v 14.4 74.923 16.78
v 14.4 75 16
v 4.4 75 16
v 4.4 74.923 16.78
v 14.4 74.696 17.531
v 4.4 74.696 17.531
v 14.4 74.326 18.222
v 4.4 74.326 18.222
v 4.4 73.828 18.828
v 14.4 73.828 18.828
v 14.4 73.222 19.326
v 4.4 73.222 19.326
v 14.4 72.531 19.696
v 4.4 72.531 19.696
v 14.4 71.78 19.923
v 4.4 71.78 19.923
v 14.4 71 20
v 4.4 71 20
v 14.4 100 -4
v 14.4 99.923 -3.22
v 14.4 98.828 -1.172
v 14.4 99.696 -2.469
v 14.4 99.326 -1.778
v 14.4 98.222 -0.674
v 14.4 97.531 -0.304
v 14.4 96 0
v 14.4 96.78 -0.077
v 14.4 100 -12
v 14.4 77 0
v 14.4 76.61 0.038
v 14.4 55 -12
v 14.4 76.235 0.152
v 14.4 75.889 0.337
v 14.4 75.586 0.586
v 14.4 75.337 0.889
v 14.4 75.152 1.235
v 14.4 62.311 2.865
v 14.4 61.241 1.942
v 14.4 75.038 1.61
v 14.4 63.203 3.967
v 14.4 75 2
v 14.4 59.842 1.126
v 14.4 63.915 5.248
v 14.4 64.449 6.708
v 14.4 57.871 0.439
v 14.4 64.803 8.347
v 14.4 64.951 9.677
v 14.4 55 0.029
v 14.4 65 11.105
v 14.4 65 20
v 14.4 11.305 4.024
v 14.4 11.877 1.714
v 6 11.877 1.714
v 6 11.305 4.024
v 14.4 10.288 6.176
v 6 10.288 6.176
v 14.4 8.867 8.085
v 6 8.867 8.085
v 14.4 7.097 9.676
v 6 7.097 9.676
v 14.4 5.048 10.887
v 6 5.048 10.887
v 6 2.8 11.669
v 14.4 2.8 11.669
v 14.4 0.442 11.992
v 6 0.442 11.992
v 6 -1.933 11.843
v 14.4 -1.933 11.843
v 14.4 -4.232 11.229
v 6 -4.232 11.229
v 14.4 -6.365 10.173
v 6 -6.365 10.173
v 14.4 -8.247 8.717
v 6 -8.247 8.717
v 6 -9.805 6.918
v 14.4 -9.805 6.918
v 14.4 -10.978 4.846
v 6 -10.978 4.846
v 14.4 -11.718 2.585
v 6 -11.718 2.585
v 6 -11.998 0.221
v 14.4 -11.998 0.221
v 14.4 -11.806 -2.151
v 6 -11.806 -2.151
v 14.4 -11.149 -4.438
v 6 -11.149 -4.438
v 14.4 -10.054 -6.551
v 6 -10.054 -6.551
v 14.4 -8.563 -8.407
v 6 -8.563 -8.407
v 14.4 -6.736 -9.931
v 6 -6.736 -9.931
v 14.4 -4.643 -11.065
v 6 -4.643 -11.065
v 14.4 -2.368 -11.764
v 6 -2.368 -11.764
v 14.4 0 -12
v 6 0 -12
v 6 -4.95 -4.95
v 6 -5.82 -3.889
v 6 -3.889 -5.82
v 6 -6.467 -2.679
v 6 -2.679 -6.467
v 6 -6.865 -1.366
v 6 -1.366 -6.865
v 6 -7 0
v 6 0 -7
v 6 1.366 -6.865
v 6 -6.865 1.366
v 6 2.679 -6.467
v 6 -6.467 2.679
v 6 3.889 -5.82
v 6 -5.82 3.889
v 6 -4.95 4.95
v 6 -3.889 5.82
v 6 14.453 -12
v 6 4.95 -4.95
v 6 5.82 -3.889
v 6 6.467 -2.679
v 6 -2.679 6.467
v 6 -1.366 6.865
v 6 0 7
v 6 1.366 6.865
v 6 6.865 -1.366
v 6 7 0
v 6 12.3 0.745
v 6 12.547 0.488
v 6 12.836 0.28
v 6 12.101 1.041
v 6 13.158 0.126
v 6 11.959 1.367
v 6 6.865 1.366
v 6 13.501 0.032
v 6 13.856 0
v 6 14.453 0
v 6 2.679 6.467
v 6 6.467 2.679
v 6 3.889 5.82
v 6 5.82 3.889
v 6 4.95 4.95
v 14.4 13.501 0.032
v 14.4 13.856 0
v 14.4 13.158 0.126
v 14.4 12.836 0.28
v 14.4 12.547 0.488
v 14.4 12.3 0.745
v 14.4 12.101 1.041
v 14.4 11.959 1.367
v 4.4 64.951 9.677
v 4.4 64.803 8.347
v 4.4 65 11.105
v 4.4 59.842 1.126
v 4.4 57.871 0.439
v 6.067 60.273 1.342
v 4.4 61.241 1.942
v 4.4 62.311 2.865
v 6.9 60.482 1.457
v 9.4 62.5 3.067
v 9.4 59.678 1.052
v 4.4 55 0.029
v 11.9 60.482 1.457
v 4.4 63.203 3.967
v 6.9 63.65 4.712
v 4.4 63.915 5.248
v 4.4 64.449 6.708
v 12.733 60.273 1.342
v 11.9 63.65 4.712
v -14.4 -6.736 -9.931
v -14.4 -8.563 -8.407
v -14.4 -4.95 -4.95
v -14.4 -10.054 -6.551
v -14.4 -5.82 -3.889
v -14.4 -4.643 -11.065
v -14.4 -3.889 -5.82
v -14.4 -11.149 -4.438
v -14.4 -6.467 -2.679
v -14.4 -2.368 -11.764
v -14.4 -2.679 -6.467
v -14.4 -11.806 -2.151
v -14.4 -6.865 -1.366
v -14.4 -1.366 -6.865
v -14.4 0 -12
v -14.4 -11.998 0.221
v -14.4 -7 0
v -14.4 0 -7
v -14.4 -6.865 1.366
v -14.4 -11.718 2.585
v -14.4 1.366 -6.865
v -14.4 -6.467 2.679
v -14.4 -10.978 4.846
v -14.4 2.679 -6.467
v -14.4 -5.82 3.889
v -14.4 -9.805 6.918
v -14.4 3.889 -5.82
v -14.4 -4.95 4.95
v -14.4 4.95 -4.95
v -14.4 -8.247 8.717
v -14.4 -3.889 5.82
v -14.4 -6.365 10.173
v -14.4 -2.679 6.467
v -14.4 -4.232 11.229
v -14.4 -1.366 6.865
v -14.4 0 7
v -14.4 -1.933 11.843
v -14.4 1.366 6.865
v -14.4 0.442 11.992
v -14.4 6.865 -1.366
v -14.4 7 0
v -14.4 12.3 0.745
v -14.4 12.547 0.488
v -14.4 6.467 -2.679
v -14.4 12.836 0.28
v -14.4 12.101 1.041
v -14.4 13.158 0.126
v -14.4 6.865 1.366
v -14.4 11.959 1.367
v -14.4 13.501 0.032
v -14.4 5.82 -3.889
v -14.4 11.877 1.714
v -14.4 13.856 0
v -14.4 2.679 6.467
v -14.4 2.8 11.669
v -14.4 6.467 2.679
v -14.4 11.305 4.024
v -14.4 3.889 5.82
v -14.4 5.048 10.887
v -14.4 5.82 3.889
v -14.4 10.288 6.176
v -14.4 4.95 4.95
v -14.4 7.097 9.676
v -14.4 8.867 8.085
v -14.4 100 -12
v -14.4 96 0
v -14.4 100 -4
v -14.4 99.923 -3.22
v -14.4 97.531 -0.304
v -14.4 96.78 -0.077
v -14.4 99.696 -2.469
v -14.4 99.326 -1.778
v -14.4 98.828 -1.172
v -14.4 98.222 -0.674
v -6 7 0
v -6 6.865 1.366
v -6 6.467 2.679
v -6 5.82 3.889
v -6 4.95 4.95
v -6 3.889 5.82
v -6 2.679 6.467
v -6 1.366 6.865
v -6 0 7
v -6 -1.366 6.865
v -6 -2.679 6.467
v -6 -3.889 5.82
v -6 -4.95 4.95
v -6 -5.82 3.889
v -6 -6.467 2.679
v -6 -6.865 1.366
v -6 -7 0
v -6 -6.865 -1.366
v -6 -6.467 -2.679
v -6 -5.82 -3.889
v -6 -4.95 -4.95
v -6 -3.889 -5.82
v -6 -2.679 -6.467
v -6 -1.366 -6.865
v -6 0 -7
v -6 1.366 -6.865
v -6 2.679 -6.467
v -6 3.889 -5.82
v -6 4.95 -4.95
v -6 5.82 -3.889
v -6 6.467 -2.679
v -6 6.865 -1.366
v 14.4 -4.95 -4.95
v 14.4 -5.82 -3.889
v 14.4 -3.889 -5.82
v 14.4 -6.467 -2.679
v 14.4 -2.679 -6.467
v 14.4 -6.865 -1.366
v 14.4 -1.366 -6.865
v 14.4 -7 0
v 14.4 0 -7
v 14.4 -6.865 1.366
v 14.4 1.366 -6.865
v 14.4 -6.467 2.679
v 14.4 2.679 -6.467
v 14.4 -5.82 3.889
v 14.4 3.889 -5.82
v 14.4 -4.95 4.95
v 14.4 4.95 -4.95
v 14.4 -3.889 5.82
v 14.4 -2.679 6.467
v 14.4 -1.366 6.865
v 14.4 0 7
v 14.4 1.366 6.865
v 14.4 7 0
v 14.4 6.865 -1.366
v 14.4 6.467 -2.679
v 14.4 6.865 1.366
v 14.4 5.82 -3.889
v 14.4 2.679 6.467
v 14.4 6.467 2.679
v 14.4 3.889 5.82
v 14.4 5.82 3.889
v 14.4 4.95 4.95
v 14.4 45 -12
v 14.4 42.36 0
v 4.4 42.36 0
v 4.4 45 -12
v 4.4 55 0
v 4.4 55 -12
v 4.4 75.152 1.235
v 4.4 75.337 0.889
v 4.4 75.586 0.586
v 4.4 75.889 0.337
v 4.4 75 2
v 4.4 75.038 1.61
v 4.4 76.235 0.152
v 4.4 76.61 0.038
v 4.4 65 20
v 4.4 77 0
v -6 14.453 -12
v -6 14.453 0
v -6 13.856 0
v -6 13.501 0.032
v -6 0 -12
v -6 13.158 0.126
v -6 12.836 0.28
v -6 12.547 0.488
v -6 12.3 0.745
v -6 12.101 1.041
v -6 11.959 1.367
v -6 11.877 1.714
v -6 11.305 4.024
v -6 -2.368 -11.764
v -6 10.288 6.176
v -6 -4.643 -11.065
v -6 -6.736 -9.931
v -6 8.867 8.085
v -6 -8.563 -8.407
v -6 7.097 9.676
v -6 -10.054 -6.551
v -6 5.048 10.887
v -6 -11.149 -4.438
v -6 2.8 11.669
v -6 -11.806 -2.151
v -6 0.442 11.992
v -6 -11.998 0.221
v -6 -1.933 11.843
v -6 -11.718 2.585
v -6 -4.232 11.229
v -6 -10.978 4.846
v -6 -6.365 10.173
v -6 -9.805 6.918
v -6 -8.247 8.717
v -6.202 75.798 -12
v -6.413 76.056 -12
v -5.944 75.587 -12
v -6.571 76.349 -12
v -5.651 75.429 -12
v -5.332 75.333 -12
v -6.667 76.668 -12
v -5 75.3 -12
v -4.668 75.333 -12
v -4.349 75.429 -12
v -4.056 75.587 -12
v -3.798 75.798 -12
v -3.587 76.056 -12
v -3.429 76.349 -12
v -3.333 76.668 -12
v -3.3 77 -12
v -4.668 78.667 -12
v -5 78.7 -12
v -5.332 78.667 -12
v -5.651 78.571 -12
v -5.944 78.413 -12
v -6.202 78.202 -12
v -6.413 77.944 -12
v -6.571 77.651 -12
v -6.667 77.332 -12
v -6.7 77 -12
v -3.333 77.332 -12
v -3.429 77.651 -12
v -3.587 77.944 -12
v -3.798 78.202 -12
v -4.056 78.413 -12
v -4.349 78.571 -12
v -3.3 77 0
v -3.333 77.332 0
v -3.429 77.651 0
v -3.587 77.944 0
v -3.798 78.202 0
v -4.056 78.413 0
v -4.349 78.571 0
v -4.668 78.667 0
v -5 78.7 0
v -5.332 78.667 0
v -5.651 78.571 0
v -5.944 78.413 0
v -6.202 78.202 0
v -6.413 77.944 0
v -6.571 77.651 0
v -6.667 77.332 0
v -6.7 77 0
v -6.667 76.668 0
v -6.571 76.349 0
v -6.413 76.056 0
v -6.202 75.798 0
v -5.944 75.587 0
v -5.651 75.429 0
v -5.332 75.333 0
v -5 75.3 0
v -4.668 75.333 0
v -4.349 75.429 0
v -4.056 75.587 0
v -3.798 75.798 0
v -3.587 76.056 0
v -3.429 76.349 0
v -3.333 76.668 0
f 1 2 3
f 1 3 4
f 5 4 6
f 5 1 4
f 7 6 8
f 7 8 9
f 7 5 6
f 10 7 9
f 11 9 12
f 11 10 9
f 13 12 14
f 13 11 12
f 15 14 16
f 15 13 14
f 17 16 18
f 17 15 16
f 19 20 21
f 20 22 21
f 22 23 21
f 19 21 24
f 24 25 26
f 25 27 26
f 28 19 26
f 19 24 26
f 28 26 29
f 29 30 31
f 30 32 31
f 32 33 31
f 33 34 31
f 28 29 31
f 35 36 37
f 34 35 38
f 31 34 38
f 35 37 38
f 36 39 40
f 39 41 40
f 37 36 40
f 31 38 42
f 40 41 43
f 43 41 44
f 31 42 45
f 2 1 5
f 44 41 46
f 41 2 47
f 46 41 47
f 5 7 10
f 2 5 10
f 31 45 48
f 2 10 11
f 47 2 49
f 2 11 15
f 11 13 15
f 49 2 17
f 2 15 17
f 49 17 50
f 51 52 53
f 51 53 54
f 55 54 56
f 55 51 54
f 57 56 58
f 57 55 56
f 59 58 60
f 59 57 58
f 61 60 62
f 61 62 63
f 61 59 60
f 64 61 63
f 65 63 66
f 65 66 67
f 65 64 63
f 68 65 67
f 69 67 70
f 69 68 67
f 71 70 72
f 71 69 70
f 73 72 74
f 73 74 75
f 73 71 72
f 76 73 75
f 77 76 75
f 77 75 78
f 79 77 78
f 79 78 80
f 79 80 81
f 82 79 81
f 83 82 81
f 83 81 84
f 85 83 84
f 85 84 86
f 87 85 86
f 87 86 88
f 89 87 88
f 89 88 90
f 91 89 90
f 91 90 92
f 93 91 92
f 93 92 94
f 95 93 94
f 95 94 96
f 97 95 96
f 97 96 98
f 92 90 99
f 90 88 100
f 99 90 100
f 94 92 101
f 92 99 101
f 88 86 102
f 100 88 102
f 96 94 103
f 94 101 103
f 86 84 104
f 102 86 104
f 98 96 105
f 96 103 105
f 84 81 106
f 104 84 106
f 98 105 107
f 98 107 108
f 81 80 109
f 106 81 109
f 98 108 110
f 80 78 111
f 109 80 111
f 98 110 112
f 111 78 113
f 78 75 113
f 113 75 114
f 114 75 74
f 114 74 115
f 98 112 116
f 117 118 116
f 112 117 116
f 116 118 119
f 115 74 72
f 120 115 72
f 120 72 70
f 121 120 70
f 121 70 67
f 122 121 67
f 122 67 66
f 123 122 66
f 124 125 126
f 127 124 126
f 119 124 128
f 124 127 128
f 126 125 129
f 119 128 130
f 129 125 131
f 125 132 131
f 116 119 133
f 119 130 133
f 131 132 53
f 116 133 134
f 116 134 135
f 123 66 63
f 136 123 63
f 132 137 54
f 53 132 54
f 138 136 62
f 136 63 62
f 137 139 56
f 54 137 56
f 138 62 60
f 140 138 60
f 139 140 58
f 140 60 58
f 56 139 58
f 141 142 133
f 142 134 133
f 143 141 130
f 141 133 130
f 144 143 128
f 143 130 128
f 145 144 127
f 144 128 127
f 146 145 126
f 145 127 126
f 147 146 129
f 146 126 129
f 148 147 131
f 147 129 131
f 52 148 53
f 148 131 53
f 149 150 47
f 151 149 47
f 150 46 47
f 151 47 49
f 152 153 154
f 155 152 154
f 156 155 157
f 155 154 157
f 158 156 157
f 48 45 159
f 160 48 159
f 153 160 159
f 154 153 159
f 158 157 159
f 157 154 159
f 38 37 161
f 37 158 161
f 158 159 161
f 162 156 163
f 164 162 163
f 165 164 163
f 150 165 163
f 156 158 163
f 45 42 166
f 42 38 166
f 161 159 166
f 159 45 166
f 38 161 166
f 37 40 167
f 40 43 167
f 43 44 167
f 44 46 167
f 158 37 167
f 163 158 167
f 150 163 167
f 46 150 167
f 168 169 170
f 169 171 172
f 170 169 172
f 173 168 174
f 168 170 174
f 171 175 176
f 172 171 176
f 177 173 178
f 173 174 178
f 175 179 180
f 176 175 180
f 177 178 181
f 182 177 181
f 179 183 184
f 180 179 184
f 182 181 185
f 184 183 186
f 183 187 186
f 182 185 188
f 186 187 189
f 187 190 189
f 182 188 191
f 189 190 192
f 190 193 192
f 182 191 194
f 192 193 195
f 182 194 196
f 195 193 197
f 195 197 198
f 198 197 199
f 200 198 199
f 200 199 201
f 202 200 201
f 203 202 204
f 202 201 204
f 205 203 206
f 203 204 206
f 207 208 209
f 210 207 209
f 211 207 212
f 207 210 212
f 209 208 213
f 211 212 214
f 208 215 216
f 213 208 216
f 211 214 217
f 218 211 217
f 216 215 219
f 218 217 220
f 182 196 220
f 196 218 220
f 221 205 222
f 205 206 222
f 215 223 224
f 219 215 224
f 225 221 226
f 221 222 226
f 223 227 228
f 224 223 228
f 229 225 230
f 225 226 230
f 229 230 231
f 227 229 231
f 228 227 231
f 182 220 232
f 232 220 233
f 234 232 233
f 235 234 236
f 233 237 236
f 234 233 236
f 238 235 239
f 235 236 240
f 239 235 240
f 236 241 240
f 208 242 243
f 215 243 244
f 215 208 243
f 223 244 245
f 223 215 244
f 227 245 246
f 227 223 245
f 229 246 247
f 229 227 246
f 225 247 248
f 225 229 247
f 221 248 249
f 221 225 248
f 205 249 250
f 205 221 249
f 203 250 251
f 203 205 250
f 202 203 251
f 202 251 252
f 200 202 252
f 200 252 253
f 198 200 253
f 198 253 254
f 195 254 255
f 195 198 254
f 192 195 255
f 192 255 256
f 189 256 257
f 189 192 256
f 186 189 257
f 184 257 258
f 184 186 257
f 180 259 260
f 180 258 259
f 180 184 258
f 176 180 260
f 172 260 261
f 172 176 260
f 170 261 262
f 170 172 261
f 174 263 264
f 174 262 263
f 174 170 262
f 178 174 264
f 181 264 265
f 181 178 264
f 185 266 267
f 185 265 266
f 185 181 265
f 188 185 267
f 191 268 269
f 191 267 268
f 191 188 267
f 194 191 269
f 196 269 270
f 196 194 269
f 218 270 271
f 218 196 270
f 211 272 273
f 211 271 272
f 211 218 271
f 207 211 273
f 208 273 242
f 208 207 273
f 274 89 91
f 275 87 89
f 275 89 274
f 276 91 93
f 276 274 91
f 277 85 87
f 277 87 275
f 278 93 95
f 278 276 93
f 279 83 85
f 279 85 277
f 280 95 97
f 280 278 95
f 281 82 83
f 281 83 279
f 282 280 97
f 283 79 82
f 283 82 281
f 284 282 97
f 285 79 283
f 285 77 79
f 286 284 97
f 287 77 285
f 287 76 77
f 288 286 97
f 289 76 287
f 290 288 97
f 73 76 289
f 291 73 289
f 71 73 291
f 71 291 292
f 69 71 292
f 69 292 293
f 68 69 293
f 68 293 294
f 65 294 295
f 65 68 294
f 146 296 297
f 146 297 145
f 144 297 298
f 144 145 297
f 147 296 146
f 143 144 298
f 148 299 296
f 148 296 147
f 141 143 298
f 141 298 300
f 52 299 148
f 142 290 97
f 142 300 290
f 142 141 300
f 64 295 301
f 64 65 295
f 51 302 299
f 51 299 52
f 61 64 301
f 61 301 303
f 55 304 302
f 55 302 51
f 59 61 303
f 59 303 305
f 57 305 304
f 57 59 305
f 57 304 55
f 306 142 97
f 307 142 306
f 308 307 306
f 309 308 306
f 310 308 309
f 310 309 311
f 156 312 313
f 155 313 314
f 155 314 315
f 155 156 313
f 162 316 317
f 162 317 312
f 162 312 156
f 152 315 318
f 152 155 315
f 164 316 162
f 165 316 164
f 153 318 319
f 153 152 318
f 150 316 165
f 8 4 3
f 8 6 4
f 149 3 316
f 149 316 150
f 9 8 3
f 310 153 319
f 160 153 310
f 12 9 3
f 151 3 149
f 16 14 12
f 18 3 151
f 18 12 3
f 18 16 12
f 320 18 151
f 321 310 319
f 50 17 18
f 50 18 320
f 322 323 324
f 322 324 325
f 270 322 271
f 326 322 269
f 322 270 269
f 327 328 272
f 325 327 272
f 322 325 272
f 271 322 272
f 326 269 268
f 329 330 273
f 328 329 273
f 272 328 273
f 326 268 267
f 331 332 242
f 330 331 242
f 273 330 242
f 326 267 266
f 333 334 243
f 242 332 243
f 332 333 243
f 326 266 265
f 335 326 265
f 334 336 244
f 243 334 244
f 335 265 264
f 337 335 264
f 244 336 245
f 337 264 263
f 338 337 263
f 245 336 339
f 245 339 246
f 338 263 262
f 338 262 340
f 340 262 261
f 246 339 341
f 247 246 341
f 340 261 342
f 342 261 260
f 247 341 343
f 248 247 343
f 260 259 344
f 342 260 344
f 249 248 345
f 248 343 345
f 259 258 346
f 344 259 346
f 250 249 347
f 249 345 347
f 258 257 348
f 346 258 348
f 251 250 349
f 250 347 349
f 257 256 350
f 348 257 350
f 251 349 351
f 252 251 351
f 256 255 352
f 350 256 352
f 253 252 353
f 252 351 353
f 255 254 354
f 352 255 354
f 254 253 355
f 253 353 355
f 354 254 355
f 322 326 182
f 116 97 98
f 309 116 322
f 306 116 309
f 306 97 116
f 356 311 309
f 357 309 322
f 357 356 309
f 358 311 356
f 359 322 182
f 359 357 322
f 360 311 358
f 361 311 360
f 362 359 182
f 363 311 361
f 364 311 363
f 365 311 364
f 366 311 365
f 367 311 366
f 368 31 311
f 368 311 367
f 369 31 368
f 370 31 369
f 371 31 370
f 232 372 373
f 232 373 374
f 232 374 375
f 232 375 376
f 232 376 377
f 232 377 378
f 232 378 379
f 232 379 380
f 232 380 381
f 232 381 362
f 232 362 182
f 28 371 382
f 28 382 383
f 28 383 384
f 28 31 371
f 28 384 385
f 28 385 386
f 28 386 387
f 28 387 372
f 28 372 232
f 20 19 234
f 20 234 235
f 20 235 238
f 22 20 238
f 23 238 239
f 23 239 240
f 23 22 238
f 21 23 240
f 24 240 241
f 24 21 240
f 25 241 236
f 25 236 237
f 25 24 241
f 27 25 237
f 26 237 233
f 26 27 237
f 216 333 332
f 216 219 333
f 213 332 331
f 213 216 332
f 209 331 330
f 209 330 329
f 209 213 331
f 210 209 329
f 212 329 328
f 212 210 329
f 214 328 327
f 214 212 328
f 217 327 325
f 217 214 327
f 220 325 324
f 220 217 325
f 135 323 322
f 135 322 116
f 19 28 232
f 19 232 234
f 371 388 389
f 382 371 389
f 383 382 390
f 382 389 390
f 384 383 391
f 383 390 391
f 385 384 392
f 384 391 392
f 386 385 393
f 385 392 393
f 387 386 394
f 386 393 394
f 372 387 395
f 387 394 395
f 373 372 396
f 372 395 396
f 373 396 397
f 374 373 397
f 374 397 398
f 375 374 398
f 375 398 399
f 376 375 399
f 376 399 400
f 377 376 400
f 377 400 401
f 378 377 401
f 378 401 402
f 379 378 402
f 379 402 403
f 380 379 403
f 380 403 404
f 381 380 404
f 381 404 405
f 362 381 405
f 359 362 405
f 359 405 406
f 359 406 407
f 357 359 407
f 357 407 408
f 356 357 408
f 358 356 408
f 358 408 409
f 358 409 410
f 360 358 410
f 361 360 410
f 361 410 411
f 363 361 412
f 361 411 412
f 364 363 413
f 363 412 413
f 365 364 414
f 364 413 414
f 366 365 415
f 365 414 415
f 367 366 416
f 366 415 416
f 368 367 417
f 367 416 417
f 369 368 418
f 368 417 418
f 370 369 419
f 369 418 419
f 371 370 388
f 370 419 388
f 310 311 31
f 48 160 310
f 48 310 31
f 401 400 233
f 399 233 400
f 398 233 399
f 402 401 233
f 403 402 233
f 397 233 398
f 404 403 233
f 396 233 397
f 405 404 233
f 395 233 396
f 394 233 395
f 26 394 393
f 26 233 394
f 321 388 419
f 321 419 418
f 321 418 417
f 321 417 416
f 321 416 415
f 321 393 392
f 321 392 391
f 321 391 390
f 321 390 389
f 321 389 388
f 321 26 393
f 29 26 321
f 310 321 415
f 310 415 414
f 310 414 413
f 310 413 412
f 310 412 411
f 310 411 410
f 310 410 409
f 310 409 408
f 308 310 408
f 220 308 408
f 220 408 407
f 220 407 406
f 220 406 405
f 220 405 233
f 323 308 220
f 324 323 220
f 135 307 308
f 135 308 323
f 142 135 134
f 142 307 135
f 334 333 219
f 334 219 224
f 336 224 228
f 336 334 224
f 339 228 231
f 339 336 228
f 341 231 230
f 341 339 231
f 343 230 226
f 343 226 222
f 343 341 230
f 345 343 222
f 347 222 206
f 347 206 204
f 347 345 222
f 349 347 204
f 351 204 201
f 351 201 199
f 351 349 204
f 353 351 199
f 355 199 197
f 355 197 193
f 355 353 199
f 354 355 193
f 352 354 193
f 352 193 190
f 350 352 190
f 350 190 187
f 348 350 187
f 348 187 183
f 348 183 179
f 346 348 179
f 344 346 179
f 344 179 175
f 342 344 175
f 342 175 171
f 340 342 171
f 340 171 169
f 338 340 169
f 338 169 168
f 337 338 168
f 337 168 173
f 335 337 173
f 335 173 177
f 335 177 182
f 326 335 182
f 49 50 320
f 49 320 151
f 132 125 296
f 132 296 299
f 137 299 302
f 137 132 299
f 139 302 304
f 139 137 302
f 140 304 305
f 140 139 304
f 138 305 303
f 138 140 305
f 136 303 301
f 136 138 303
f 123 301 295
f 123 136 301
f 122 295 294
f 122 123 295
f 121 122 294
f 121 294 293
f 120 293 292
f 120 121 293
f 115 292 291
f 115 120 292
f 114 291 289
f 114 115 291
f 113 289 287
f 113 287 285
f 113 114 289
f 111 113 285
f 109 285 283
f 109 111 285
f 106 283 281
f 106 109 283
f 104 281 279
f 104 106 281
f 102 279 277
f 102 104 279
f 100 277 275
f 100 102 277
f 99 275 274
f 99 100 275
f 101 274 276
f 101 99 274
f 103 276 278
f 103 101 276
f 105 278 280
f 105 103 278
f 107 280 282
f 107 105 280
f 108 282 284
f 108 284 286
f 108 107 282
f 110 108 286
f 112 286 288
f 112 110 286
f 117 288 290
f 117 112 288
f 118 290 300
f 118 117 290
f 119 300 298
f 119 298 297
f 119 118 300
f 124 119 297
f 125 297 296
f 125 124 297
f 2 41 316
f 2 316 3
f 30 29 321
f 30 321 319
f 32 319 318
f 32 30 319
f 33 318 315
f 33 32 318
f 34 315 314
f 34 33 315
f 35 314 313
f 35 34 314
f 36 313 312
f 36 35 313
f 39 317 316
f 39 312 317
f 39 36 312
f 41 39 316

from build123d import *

# Parameters (mm, degrees)
F0_R         = 7
F1_DEPTH     = 14.4
F2_W         = 12
F2_H         = 26.4532811218
F2_H_2       = 2.4532811218
F3_DEPTH     = 15
F4_R         = 2
F6_DEPTH     = 25
F7_W         = 18.8
F7_H         = 33.2335345083
F7_H_2       = 13.5664814711
F8_DEPTH     = 25
F11_DEPTH    = 10
F12_T4_DEPTH = 10


# Not quite as in the source:
# - a fillet or chamfer that OpenCascade refuses, or shapes differently, is made with other operations: its cross-section is extruded or revolved along the edge and cut away or added


with BuildPart() as f1:
    # F0 (on Right) → F1 (new body, symmetric)
    with BuildSketch(Plane.YZ):
        with BuildLine():
            Line((42.36, 0), (12, 0))
            ThreePointArc((12, 0), (-8.4852813742, 8.4852813742), (0, -12))
            Line((0, -12), (47.36, -12))
            Line((47.36, -12), (42.36, 0))
        make_face()
        Circle(F0_R, mode=Mode.SUBTRACT)
        Polygon((57.36, 0), (42.36, 0), (47.36, -12), (57.36, -12), align=None)
        with BuildLine():
            Line((65, 0), (57.36, 0))
            Line((57.36, 0), (57.36, -12))
            Line((57.36, -12), (100, -12))
            Line((100, -12), (100, -4))
            ThreePointArc((100, -4), (98.8284271247, -1.1715728753), (96, 0))
            Line((96, 0), (77, 0))
            ThreePointArc((77, 0), (75.5857864376, 0.5857864376), (75, 2))
            Line((75, 2), (75, 16))
            ThreePointArc((75, 16), (73.8284271247, 18.8284271247), (71, 20))
            Line((71, 20), (65, 20))
            Line((65, 20), (65, 0))
        make_face()
    extrude(amount=F1_DEPTH, both=True)

    # F2 (on face) → F3 (cut, symmetric)
    with BuildSketch(Plane.XY):
        with Locations((0, -1.2266405609)):
            Rectangle(F2_W, F2_H)
        with Locations((0, 13.2266405609)):
            Rectangle(F2_W, F2_H_2)
    extrude(amount=F3_DEPTH, both=True, mode=Mode.SUBTRACT)

    # F4
    f4_edges = [f1.edges().sort_by_distance(p)[0] for p in [
        (10.2, 12, 0),
        (-10.2, 12, 0),
    ]]
    fillet(f4_edges, radius=F4_R)

    # F5 (on face) → F6 (cut)
    with BuildSketch(Plane.XY):
        with BuildLine():
            Line((-5, 77), (-6.7, 77))
            ThreePointArc((-6.7, 77), (-5, 75.3), (-3.3, 77))
            Line((-3.3, 77), (-5, 77))
        make_face()
        with BuildLine():
            ThreePointArc((-3.3, 77), (-5, 78.7), (-6.7, 77))
            Line((-6.7, 77), (-5, 77))
            Line((-5, 77), (-3.3, 77))
        make_face()
    extrude(amount=-F6_DEPTH, mode=Mode.SUBTRACT)

    # F7 (on face) → F8 (cut)
    with BuildSketch(Plane.XY):
        with Locations((-5, 81.6167672542)):
            Rectangle(F7_W, F7_H)
        with Locations((-5, 58.2167592645)):
            Rectangle(F7_W, F7_H_2)
    extrude(amount=F8_DEPTH, mode=Mode.SUBTRACT)

    # F10 (on face) → F11 (cut)
    with BuildSketch(Plane.YZ.offset(14.4)):
        Polygon((55, -12), (55, 0), (42.36, 0), (45, -12), align=None)
    extrude(amount=-F11_DEPTH, mode=Mode.SUBTRACT)

    # F12: fillet of radius 11.1053823869 on 1 edges, made by hand


with BuildPart() as f12_tool2:
    # F12_s3 → F12_t4 (new body)
    with BuildSketch(Plane.YZ.offset(14.4)):
        with BuildLine():
            add(Edge.make_bspline(
                [(53.8946176131, 0), (65, 0), (65, 11.1053823869)],
                knots=[0, 0, 0, 1, 1, 1], degree=2, weights=[1, 1, 1]))
            Line((65, 11.1053823869), (65, 0))
            Line((65, 0), (53.8946176131, 0))
        make_face()
    extrude(amount=-F12_T4_DEPTH)

    split(bisect_by=Plane.XZ.offset(-55), keep=Keep.BOTTOM)


with BuildPart() as f1_1:
    add(f1.part)

    # F12_t1: union F12_tool2
    add(f12_tool2.part)


solid = f1_1.part
